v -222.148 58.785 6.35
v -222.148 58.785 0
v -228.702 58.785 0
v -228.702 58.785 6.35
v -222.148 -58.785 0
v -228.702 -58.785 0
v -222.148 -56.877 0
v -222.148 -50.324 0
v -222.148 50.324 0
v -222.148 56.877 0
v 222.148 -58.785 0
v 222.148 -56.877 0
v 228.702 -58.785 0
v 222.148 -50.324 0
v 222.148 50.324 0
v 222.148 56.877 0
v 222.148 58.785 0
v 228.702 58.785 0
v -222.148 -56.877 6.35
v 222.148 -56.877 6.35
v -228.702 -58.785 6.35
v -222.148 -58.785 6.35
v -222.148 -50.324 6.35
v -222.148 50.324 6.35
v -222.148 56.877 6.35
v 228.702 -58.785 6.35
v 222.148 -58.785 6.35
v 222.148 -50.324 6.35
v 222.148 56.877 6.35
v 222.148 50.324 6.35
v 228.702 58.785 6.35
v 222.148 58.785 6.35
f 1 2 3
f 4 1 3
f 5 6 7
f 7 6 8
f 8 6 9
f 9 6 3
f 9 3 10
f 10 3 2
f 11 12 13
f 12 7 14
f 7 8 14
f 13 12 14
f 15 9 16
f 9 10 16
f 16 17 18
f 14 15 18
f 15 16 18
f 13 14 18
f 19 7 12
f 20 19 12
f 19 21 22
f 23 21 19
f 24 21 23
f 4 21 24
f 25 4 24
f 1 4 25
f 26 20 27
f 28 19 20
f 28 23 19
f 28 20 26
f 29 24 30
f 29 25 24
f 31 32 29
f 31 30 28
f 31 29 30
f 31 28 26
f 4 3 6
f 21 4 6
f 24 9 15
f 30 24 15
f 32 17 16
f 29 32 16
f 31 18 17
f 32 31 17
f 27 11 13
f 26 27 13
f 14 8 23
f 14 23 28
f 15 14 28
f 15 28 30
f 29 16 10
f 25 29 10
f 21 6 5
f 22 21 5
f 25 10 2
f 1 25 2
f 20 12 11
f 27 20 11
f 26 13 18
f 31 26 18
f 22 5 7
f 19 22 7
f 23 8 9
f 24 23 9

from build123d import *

# Parameters (mm, degrees)
SKETCH1_W           = 444.2968
SKETCH1_H           = 100.6475
BOSS_EXTRUDE1_DEPTH = 6.35


with BuildPart() as part:
    # Sketch1 → Boss-Extrude1 (new body)
    with BuildSketch(Plane.XY):
        Polygon((222.1484, -58.785125), (228.7016, -58.785125), (228.7016, 58.785125), (222.1484, 58.785125), (222.1484, 56.87695), (-222.1484, 56.87695), (-222.1484, 58.785125), (-228.7016, 58.785125), (-228.7016, -58.785125), (-222.1484, -58.785125), (-222.1484, -56.87695), (222.1484, -56.87695), align=None)
        Rectangle(SKETCH1_W, SKETCH1_H, mode=Mode.SUBTRACT)
    extrude(amount=BOSS_EXTRUDE1_DEPTH)


solid = part.part
